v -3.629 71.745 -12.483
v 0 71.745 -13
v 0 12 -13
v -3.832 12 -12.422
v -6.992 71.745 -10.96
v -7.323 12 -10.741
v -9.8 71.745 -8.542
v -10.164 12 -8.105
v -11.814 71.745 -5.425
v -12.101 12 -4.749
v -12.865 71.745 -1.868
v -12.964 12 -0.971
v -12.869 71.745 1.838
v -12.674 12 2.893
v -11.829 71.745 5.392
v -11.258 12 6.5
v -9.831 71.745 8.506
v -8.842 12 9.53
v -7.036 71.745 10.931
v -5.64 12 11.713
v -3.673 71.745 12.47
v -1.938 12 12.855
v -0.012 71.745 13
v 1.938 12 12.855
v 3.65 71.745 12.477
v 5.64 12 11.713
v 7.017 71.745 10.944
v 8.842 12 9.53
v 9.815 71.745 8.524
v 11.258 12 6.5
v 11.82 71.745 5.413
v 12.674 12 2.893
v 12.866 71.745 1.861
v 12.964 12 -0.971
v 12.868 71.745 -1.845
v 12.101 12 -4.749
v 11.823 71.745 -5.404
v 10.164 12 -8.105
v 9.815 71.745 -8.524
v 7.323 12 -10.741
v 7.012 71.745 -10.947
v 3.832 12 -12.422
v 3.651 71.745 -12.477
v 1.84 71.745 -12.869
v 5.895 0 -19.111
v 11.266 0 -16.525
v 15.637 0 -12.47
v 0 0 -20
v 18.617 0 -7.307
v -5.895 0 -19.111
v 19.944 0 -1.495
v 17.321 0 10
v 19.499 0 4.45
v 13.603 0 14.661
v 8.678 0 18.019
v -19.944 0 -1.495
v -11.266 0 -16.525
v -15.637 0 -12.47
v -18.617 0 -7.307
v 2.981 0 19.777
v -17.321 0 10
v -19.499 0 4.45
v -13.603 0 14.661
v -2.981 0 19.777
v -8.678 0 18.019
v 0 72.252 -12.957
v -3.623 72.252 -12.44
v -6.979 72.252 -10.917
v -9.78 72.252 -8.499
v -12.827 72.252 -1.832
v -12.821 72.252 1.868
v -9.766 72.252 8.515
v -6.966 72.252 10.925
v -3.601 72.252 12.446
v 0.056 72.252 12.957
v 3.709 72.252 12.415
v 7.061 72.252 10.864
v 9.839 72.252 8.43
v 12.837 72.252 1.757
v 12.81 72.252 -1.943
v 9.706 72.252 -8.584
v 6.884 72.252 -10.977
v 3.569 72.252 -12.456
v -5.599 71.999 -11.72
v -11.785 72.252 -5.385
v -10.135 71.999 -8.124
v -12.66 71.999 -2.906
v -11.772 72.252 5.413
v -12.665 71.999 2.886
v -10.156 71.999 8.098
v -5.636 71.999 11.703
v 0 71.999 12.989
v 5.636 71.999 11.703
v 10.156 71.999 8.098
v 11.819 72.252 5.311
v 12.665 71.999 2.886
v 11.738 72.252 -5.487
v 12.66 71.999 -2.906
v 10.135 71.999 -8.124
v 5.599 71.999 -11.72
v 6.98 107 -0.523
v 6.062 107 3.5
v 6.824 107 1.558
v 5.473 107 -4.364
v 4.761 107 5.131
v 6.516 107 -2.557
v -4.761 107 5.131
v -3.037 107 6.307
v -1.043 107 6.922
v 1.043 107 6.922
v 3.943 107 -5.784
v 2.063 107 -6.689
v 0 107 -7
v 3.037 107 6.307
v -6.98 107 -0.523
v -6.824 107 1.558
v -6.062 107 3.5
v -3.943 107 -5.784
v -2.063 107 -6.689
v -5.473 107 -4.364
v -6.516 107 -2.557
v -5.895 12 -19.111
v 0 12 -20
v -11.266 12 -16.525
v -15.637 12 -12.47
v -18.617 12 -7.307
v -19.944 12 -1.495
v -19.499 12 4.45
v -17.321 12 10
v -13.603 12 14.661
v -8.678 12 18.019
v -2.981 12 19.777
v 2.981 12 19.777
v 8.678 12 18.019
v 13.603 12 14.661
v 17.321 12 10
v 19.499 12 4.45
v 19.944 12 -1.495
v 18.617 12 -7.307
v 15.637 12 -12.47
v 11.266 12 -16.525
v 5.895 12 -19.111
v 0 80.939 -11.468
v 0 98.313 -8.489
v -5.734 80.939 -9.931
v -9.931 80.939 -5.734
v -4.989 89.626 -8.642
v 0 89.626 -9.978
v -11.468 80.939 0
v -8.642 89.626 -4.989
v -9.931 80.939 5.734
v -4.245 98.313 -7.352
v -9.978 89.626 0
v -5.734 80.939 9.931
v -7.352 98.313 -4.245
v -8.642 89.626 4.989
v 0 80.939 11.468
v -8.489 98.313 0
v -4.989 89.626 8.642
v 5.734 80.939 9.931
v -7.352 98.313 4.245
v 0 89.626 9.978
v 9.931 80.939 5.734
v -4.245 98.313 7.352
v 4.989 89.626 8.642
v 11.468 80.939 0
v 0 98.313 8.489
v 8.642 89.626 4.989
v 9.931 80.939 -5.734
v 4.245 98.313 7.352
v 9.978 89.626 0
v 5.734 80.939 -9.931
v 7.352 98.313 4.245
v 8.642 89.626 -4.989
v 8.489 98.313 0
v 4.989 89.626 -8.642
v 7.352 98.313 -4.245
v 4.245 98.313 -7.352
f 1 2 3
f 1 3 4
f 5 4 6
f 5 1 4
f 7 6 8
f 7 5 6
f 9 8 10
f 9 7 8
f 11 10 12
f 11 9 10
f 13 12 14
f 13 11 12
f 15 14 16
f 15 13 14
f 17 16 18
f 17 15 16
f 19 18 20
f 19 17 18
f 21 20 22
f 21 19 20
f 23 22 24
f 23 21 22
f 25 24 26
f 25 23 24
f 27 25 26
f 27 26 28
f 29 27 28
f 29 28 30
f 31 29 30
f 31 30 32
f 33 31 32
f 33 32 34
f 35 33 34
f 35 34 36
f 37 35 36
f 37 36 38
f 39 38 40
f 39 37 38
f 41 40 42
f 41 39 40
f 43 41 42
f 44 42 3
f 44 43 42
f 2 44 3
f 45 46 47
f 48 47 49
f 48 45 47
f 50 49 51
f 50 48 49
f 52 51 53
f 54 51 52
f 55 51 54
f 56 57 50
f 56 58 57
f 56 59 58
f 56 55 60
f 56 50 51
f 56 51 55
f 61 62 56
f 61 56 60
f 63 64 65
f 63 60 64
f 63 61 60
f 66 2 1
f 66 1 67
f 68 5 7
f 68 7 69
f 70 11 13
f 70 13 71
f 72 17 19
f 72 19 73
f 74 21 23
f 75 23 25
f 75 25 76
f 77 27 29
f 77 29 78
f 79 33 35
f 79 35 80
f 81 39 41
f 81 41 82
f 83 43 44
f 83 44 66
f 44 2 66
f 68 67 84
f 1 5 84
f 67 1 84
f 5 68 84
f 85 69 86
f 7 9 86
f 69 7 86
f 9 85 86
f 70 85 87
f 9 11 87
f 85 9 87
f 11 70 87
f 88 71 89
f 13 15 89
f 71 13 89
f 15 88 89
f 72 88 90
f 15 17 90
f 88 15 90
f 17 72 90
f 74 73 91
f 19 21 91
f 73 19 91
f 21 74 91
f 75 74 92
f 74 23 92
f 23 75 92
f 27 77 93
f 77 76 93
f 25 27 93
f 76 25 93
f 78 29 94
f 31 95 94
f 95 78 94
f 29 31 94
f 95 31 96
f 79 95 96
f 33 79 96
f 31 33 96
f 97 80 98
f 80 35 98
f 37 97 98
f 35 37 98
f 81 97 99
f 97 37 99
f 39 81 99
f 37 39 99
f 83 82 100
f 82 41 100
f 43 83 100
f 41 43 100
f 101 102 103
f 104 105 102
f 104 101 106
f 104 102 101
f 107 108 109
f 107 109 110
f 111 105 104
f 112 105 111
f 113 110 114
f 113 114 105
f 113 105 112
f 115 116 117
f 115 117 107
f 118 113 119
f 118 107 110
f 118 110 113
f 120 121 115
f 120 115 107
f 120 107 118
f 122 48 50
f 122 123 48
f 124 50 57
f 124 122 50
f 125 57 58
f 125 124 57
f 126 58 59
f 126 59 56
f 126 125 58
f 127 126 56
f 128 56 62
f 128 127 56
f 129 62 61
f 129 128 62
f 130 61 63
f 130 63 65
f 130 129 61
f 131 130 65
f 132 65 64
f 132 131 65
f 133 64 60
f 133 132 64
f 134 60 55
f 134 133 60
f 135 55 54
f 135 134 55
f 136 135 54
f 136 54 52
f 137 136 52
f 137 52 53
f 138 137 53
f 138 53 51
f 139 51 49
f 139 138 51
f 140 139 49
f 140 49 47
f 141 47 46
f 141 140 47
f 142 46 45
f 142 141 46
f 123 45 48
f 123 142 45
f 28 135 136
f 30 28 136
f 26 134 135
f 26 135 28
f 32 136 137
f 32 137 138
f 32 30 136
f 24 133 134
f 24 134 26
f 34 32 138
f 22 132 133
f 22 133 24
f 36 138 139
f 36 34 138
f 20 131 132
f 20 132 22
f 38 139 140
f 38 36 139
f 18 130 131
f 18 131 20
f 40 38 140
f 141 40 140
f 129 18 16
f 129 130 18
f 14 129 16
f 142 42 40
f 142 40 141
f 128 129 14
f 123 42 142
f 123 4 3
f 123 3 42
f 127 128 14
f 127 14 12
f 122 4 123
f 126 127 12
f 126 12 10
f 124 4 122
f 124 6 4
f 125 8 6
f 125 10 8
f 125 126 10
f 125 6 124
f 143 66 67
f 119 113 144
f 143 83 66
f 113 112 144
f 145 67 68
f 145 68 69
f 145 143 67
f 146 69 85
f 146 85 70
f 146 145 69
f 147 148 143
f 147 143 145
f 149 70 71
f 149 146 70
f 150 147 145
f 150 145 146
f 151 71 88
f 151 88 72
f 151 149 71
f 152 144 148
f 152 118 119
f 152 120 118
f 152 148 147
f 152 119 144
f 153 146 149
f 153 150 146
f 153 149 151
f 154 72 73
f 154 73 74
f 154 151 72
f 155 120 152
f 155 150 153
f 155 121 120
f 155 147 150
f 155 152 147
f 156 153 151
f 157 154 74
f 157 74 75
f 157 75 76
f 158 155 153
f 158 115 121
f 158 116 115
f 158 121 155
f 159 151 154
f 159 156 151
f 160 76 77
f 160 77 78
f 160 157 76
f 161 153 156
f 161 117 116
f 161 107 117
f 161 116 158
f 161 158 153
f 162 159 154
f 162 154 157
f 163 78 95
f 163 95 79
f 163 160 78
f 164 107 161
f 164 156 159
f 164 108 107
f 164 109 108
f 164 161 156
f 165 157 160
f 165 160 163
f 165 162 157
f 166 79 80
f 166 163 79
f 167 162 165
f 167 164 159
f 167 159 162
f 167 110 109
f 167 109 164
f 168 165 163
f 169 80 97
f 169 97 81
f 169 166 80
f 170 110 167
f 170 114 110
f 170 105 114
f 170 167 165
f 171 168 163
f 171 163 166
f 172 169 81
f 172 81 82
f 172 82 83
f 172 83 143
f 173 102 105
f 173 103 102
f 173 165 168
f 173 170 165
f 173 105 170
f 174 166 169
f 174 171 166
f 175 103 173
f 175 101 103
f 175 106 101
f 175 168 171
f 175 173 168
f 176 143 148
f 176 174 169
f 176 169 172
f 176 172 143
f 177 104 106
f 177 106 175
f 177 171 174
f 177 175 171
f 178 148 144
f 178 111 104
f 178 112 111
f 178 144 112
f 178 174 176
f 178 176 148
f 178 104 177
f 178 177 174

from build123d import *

# Parameters (mm, degrees)
FILLET_1_R = 3


with BuildPart() as part:
    # 草图1 → Revolve 292 (revolve)
    with BuildSketch(Plane.XY, mode=Mode.PRIVATE) as revolve_292_sk:
        Polygon((0, 0), (20, 0), (20, 12), (13, 12), (13, 72), (7, 107), (0, 107), align=None)
    revolve(revolve_292_sk.sketch.rotate(Axis((0, 0, 0), (0, 1, 0)), 90), axis=Axis((0, 0, 0), (0, 1, 0)))

    # 圆角1
    fillet_1_edges = [part.edges().sort_by_distance(p)[0] for p in [
        (0, 72, 13),
    ]]
    fillet(fillet_1_edges, radius=FILLET_1_R)


solid = part.part
